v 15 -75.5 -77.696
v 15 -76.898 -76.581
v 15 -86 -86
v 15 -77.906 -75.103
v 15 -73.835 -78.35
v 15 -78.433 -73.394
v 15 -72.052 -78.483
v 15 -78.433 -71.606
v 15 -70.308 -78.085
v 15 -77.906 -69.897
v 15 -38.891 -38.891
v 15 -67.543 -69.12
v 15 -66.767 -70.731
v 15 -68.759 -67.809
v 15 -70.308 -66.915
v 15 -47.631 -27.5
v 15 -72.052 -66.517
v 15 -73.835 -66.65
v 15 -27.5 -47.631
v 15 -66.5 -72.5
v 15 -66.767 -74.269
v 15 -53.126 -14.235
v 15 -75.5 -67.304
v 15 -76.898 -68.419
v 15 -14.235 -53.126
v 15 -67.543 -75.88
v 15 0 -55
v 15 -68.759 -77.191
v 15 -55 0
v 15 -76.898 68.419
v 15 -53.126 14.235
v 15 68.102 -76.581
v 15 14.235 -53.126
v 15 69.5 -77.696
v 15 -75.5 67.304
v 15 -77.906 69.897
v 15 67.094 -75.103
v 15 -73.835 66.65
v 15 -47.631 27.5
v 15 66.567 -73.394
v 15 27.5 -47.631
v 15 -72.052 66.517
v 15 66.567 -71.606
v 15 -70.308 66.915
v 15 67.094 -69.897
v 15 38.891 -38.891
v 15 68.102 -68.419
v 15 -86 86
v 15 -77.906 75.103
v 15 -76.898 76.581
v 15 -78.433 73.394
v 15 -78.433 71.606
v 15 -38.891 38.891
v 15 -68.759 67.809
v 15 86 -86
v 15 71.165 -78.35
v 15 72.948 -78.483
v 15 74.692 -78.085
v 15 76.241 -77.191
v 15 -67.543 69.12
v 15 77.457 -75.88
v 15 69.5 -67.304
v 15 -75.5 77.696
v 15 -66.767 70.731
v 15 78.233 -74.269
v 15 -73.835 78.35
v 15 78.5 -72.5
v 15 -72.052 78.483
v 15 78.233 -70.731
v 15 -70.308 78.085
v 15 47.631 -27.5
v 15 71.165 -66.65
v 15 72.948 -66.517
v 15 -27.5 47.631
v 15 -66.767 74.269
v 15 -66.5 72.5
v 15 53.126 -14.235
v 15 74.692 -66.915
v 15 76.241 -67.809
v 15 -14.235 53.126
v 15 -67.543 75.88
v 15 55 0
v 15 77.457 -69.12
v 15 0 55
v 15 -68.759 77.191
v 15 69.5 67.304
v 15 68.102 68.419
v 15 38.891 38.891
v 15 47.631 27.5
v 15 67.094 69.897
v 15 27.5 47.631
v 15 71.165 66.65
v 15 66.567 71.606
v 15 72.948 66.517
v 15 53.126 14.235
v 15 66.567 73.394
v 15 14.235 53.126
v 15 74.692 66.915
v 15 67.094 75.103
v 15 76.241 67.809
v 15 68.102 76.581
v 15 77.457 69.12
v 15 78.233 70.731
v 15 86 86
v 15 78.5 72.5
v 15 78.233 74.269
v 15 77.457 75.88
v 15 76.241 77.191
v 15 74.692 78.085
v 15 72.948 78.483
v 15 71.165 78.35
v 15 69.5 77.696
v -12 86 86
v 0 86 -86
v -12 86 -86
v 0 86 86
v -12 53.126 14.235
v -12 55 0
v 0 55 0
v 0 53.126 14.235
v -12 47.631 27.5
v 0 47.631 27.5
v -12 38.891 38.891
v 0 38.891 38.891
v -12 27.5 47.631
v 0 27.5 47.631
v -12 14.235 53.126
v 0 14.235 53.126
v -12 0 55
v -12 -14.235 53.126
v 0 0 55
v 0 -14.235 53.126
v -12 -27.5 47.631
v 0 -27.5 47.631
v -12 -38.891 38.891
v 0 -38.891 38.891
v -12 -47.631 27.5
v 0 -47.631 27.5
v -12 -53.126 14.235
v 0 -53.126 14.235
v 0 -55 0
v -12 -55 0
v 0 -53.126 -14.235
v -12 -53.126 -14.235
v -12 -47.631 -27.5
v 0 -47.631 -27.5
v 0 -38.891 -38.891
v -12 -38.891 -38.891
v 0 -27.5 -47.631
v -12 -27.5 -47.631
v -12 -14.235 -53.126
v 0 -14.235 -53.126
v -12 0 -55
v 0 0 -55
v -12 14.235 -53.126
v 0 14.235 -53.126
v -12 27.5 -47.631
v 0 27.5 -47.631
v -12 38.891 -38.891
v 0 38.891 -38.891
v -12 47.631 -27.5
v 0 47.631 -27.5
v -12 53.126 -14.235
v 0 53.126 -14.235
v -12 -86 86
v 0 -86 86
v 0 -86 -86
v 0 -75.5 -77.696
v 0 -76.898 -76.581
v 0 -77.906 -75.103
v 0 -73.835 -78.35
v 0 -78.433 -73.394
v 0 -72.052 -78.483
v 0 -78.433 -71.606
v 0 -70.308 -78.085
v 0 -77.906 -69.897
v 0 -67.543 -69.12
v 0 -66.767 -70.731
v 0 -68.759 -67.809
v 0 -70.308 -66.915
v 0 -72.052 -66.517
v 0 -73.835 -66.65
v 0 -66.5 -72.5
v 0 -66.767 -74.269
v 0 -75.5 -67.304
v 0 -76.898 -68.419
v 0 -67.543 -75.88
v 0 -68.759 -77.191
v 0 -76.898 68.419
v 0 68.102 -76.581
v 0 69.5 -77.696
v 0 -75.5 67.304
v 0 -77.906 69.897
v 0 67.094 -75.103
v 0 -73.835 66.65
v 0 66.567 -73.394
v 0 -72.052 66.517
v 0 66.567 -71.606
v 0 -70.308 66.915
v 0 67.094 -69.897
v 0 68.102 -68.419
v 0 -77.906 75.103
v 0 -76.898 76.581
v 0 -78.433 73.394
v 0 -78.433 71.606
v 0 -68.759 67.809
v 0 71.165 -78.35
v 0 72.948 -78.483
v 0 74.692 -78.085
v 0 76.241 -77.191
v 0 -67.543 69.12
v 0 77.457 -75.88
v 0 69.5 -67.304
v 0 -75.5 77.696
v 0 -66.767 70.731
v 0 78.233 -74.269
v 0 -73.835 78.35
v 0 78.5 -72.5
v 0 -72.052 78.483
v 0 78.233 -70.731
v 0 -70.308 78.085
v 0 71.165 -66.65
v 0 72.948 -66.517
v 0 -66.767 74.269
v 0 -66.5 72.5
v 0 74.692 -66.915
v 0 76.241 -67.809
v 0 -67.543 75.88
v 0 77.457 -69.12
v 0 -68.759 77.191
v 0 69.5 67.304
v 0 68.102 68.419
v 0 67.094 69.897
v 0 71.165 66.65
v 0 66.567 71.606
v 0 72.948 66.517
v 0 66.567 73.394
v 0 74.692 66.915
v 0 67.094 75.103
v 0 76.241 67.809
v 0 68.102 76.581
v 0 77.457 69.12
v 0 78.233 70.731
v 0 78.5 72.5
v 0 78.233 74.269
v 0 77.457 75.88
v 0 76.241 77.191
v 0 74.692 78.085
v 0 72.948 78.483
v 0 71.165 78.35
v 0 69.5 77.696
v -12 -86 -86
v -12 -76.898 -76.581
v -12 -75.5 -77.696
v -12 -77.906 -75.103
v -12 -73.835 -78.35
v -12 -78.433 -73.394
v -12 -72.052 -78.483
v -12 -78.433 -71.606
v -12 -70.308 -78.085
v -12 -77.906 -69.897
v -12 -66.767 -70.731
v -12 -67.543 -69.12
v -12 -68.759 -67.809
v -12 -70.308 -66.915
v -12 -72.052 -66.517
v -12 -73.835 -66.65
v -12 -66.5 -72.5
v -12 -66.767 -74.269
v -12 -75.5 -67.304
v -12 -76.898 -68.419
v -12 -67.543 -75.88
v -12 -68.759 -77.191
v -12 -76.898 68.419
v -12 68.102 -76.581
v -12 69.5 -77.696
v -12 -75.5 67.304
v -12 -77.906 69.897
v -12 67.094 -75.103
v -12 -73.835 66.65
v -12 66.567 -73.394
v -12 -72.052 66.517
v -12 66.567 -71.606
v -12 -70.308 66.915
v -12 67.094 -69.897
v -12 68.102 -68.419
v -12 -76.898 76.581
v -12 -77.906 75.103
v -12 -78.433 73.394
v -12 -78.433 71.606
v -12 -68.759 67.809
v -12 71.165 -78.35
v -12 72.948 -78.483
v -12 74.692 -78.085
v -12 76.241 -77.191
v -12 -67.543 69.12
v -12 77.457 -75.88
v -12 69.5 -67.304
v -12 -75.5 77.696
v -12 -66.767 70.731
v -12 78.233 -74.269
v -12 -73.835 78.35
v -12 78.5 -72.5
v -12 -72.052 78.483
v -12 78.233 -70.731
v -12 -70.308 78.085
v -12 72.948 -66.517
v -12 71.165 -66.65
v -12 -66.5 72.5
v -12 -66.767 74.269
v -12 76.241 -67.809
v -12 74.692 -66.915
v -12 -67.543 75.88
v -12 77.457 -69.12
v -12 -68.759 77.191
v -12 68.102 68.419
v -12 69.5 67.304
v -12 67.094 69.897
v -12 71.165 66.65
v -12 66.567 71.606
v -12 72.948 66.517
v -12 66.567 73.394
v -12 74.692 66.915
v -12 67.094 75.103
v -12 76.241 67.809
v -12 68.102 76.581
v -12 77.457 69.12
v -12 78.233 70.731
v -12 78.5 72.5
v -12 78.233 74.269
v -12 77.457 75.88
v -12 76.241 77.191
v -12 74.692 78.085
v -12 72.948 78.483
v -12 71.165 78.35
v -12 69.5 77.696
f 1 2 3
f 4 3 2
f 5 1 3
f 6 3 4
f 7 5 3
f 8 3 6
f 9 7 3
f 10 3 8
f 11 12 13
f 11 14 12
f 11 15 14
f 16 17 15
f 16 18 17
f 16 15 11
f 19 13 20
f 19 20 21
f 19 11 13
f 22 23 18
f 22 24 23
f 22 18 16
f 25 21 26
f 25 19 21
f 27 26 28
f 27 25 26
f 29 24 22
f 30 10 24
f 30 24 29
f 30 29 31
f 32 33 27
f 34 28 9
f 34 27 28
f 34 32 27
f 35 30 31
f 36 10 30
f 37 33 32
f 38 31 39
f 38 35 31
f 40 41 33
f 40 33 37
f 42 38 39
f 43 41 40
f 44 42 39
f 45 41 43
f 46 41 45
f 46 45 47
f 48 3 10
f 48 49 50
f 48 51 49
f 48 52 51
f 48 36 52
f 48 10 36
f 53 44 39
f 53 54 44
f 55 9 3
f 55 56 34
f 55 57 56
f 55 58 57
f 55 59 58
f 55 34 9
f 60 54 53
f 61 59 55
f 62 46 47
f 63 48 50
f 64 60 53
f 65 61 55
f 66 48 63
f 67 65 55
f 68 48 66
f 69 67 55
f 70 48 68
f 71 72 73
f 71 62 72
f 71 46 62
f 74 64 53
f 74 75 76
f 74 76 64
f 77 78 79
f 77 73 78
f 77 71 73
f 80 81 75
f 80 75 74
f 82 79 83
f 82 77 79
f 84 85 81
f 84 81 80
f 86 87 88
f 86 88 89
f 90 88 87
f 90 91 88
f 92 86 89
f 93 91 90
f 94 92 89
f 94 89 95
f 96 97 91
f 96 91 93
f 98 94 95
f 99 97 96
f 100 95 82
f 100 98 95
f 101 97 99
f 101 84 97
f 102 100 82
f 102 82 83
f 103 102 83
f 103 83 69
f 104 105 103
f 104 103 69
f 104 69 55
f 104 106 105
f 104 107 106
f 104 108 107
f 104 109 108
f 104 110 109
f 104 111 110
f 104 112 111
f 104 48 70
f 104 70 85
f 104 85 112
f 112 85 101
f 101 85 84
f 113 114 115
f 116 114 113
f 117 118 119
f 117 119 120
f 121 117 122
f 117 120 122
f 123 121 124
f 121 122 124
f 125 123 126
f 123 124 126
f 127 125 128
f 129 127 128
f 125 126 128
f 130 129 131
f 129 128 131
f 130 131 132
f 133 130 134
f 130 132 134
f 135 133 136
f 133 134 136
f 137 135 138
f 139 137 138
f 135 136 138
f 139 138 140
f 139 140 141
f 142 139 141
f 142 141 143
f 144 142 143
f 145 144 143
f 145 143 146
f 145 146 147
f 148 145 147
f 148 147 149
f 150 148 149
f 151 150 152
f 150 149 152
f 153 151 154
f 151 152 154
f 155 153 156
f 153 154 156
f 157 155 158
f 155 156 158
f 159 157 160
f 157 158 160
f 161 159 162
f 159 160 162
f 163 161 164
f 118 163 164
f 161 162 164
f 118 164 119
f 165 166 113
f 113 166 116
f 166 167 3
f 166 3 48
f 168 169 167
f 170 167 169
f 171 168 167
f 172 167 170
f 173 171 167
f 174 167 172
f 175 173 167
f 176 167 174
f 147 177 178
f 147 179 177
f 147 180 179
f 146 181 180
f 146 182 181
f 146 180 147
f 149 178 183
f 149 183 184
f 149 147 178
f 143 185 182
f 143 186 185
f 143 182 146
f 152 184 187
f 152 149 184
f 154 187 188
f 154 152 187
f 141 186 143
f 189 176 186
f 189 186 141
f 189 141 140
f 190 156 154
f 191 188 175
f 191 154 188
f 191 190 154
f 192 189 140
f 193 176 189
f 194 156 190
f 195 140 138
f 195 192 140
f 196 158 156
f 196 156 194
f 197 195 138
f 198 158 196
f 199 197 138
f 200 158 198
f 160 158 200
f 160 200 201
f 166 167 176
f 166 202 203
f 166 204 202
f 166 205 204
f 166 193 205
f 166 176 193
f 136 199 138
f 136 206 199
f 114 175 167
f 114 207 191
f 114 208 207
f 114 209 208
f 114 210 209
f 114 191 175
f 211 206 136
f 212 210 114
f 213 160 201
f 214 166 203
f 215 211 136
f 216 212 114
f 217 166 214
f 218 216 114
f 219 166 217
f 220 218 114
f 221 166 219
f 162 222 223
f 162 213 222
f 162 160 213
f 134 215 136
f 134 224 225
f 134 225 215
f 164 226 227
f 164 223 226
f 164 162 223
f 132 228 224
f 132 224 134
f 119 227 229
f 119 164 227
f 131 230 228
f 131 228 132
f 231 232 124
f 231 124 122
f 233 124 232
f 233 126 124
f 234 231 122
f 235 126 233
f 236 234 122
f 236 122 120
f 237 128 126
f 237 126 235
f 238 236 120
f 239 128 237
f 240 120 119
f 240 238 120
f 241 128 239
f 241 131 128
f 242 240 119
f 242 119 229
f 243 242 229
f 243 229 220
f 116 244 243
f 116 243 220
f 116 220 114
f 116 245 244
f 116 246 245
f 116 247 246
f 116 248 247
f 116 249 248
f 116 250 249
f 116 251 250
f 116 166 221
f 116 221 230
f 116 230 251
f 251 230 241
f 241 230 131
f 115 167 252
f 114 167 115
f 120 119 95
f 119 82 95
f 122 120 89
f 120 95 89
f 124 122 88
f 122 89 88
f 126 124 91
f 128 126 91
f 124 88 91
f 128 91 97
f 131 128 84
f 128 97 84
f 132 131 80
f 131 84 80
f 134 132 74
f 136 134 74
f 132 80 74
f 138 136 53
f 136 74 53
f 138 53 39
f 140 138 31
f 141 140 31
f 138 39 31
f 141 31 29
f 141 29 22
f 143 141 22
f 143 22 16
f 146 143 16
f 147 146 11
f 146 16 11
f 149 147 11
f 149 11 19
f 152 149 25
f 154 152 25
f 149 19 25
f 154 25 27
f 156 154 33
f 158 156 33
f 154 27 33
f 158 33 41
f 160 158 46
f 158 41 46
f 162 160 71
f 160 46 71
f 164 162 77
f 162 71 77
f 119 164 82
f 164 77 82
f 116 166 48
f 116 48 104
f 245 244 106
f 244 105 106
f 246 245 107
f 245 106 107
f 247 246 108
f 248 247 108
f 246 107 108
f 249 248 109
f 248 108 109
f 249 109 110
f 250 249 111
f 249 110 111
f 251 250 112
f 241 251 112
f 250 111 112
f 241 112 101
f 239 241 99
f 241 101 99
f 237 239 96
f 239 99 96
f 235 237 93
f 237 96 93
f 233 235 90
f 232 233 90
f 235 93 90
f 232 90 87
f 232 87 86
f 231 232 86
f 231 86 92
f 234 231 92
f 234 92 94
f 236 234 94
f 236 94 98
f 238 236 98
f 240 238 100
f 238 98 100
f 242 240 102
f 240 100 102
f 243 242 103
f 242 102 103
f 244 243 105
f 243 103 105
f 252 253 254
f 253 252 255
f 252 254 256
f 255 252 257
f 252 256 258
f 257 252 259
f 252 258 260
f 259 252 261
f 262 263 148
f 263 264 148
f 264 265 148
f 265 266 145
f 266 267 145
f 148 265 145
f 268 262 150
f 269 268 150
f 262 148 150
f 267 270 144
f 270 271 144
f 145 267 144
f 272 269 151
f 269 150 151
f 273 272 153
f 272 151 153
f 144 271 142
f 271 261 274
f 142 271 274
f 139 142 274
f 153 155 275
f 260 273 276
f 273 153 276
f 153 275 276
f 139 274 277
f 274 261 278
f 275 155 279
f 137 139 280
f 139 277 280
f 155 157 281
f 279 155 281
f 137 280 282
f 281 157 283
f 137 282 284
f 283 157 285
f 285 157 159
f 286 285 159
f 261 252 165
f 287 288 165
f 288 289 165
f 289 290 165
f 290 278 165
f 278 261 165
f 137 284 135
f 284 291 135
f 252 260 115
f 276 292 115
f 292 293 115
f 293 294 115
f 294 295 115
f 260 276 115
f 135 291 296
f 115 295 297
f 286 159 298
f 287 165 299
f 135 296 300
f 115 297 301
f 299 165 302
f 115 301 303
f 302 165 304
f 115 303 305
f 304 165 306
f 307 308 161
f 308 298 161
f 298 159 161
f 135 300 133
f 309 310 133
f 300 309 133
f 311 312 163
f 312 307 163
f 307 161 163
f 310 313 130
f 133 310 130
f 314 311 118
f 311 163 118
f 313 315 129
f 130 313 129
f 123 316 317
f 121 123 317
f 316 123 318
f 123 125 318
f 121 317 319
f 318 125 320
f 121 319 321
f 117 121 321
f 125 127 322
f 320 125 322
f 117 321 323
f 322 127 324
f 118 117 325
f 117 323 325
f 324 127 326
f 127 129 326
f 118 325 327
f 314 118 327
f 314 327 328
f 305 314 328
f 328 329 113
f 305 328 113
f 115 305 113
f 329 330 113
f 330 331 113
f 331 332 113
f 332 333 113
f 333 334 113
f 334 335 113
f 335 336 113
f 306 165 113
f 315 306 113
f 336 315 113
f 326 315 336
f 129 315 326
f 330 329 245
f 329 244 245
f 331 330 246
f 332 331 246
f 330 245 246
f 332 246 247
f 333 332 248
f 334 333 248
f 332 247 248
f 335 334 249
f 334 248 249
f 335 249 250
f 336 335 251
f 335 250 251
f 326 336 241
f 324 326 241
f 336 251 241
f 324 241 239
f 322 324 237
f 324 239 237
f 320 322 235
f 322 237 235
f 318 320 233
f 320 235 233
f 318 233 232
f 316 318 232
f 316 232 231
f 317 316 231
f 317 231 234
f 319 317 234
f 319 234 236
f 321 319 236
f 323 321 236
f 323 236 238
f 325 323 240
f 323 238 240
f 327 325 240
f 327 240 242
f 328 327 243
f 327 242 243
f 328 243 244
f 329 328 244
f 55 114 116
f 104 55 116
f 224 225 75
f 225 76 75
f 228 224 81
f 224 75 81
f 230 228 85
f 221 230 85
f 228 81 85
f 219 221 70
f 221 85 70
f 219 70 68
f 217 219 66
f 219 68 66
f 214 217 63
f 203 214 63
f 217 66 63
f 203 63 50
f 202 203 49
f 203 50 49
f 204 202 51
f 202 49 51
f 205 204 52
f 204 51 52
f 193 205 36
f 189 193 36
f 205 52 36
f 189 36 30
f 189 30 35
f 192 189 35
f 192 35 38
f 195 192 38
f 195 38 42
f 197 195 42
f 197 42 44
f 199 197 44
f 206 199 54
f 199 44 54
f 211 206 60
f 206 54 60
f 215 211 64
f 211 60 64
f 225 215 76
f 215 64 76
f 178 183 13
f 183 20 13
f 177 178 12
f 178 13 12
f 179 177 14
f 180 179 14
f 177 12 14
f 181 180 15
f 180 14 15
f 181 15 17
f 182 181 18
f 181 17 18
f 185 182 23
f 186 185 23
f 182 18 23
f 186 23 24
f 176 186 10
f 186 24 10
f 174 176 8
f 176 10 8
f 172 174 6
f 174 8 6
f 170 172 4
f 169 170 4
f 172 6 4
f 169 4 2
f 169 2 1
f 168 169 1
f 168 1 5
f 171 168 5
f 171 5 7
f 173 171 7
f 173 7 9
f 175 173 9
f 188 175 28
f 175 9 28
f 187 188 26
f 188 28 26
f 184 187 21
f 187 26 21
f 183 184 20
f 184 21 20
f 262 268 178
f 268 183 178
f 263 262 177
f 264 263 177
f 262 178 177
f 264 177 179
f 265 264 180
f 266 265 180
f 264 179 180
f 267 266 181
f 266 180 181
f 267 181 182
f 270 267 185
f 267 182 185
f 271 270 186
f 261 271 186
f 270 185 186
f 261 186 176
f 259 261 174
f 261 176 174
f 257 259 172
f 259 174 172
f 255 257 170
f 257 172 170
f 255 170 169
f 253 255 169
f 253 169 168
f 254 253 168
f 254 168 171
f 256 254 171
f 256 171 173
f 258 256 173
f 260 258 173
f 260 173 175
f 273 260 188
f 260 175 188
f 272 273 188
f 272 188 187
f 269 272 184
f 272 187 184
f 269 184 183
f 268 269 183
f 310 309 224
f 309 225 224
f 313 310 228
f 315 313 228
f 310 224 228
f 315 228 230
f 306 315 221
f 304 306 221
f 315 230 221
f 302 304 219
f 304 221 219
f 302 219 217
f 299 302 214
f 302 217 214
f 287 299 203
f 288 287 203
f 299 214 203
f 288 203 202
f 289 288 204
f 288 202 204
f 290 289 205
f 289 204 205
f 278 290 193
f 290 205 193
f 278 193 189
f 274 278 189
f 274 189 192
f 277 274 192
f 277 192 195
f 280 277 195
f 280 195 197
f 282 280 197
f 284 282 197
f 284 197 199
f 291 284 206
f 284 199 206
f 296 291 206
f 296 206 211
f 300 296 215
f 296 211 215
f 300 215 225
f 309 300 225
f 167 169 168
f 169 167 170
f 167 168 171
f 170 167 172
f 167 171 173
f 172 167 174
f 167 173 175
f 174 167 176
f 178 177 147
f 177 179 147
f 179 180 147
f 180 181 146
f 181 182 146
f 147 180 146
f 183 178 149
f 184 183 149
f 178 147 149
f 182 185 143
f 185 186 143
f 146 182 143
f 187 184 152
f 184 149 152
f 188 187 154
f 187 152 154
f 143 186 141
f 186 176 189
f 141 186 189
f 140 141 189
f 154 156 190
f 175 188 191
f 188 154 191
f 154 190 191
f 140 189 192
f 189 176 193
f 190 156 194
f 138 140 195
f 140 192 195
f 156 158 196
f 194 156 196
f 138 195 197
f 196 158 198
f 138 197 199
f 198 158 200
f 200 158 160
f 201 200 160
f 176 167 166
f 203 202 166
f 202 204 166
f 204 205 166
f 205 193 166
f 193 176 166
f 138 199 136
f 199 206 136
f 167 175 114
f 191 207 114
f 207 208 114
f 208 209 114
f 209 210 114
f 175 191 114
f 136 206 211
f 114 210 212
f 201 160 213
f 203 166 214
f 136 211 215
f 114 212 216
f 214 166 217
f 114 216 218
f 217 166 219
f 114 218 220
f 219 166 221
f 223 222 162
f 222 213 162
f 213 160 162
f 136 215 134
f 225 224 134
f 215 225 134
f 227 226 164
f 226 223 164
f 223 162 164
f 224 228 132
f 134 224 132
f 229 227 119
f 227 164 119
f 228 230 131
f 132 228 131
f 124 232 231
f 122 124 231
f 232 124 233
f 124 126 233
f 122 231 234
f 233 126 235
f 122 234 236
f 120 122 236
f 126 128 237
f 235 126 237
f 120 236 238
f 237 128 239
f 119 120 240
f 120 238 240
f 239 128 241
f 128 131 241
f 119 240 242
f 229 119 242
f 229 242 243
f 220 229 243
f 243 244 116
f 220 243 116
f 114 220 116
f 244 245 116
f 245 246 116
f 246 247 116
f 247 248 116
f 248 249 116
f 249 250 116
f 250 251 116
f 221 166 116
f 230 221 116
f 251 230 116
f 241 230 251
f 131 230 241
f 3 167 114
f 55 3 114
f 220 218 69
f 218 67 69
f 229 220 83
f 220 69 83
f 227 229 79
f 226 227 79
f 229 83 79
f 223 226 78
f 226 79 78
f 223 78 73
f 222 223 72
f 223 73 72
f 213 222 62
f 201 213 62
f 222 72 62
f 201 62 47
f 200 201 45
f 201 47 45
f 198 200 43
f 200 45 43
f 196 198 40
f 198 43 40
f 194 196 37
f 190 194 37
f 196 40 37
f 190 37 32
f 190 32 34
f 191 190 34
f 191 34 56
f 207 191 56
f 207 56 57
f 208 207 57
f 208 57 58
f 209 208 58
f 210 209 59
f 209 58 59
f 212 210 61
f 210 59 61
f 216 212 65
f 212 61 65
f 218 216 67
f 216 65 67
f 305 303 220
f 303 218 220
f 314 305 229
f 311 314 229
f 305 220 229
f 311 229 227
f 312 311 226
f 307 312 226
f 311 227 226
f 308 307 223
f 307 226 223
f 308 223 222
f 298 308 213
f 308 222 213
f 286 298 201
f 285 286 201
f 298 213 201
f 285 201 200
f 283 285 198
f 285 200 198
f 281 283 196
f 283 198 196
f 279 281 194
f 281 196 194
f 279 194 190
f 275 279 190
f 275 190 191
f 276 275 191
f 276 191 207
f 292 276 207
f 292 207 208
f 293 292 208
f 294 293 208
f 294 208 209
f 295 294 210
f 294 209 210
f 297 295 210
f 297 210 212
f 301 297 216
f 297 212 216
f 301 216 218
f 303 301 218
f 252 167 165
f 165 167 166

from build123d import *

# Parameters (mm, degrees)
F0_W          = 172
F0_H          = 172
F1_DEPTH      = 15
F2_DEPTH      = 12
F3_R          = 6
F4_DEPTH      = 25
F4_DEPTH_BACK = 25
F6_R          = 55
F7_DEPTH      = 25
F7_DEPTH_BACK = 25


with BuildPart() as f1:
    # F0 (on Right) → F1 (new body)
    with BuildSketch(Plane.YZ):
        Rectangle(F0_W, F0_H)
    extrude(amount=F1_DEPTH)


with BuildPart() as f2:
    # F0 (on Right) → F2 (new body)
    with BuildSketch(Plane.YZ):
        Rectangle(F0_W, F0_H)
    extrude(amount=-F2_DEPTH)


with BuildPart() as f4:
    # F3 (on Right) → F4 (new body, two sides)
    with BuildSketch(Plane.YZ) as f4_sk:
        with Locations((-72.5, 72.5)):
            Circle(F3_R)
        with Locations((-72.5, -72.5)):
            Circle(F3_R)
        with Locations((72.5, 72.5)):
            Circle(F3_R)
        with Locations((72.5, -72.5)):
            Circle(F3_R)
    extrude(amount=F4_DEPTH)
    extrude(f4_sk.sketch, amount=-F4_DEPTH_BACK)


with BuildPart() as f1_1:
    add(f1.part)

    # F5: cut F4
    add(f4.part, mode=Mode.SUBTRACT)


with BuildPart() as f2_1:
    add(f2.part)

    # F5: cut F4
    add(f4.part, mode=Mode.SUBTRACT)


with BuildPart() as f7:
    # F6 (on Right) → F7 (new body, two sides)
    with BuildSketch(Plane.YZ) as f7_sk:
        Circle(F6_R)
    extrude(amount=F7_DEPTH)
    extrude(f7_sk.sketch, amount=-F7_DEPTH_BACK)


with BuildPart() as f1_2:
    add(f1_1.part)

    # F8: cut F7
    add(f7.part, mode=Mode.SUBTRACT)


with BuildPart() as f2_2:
    add(f2_1.part)

    # F8: cut F7
    add(f7.part, mode=Mode.SUBTRACT)


solid = Compound([f1_2.part, f2_2.part])
